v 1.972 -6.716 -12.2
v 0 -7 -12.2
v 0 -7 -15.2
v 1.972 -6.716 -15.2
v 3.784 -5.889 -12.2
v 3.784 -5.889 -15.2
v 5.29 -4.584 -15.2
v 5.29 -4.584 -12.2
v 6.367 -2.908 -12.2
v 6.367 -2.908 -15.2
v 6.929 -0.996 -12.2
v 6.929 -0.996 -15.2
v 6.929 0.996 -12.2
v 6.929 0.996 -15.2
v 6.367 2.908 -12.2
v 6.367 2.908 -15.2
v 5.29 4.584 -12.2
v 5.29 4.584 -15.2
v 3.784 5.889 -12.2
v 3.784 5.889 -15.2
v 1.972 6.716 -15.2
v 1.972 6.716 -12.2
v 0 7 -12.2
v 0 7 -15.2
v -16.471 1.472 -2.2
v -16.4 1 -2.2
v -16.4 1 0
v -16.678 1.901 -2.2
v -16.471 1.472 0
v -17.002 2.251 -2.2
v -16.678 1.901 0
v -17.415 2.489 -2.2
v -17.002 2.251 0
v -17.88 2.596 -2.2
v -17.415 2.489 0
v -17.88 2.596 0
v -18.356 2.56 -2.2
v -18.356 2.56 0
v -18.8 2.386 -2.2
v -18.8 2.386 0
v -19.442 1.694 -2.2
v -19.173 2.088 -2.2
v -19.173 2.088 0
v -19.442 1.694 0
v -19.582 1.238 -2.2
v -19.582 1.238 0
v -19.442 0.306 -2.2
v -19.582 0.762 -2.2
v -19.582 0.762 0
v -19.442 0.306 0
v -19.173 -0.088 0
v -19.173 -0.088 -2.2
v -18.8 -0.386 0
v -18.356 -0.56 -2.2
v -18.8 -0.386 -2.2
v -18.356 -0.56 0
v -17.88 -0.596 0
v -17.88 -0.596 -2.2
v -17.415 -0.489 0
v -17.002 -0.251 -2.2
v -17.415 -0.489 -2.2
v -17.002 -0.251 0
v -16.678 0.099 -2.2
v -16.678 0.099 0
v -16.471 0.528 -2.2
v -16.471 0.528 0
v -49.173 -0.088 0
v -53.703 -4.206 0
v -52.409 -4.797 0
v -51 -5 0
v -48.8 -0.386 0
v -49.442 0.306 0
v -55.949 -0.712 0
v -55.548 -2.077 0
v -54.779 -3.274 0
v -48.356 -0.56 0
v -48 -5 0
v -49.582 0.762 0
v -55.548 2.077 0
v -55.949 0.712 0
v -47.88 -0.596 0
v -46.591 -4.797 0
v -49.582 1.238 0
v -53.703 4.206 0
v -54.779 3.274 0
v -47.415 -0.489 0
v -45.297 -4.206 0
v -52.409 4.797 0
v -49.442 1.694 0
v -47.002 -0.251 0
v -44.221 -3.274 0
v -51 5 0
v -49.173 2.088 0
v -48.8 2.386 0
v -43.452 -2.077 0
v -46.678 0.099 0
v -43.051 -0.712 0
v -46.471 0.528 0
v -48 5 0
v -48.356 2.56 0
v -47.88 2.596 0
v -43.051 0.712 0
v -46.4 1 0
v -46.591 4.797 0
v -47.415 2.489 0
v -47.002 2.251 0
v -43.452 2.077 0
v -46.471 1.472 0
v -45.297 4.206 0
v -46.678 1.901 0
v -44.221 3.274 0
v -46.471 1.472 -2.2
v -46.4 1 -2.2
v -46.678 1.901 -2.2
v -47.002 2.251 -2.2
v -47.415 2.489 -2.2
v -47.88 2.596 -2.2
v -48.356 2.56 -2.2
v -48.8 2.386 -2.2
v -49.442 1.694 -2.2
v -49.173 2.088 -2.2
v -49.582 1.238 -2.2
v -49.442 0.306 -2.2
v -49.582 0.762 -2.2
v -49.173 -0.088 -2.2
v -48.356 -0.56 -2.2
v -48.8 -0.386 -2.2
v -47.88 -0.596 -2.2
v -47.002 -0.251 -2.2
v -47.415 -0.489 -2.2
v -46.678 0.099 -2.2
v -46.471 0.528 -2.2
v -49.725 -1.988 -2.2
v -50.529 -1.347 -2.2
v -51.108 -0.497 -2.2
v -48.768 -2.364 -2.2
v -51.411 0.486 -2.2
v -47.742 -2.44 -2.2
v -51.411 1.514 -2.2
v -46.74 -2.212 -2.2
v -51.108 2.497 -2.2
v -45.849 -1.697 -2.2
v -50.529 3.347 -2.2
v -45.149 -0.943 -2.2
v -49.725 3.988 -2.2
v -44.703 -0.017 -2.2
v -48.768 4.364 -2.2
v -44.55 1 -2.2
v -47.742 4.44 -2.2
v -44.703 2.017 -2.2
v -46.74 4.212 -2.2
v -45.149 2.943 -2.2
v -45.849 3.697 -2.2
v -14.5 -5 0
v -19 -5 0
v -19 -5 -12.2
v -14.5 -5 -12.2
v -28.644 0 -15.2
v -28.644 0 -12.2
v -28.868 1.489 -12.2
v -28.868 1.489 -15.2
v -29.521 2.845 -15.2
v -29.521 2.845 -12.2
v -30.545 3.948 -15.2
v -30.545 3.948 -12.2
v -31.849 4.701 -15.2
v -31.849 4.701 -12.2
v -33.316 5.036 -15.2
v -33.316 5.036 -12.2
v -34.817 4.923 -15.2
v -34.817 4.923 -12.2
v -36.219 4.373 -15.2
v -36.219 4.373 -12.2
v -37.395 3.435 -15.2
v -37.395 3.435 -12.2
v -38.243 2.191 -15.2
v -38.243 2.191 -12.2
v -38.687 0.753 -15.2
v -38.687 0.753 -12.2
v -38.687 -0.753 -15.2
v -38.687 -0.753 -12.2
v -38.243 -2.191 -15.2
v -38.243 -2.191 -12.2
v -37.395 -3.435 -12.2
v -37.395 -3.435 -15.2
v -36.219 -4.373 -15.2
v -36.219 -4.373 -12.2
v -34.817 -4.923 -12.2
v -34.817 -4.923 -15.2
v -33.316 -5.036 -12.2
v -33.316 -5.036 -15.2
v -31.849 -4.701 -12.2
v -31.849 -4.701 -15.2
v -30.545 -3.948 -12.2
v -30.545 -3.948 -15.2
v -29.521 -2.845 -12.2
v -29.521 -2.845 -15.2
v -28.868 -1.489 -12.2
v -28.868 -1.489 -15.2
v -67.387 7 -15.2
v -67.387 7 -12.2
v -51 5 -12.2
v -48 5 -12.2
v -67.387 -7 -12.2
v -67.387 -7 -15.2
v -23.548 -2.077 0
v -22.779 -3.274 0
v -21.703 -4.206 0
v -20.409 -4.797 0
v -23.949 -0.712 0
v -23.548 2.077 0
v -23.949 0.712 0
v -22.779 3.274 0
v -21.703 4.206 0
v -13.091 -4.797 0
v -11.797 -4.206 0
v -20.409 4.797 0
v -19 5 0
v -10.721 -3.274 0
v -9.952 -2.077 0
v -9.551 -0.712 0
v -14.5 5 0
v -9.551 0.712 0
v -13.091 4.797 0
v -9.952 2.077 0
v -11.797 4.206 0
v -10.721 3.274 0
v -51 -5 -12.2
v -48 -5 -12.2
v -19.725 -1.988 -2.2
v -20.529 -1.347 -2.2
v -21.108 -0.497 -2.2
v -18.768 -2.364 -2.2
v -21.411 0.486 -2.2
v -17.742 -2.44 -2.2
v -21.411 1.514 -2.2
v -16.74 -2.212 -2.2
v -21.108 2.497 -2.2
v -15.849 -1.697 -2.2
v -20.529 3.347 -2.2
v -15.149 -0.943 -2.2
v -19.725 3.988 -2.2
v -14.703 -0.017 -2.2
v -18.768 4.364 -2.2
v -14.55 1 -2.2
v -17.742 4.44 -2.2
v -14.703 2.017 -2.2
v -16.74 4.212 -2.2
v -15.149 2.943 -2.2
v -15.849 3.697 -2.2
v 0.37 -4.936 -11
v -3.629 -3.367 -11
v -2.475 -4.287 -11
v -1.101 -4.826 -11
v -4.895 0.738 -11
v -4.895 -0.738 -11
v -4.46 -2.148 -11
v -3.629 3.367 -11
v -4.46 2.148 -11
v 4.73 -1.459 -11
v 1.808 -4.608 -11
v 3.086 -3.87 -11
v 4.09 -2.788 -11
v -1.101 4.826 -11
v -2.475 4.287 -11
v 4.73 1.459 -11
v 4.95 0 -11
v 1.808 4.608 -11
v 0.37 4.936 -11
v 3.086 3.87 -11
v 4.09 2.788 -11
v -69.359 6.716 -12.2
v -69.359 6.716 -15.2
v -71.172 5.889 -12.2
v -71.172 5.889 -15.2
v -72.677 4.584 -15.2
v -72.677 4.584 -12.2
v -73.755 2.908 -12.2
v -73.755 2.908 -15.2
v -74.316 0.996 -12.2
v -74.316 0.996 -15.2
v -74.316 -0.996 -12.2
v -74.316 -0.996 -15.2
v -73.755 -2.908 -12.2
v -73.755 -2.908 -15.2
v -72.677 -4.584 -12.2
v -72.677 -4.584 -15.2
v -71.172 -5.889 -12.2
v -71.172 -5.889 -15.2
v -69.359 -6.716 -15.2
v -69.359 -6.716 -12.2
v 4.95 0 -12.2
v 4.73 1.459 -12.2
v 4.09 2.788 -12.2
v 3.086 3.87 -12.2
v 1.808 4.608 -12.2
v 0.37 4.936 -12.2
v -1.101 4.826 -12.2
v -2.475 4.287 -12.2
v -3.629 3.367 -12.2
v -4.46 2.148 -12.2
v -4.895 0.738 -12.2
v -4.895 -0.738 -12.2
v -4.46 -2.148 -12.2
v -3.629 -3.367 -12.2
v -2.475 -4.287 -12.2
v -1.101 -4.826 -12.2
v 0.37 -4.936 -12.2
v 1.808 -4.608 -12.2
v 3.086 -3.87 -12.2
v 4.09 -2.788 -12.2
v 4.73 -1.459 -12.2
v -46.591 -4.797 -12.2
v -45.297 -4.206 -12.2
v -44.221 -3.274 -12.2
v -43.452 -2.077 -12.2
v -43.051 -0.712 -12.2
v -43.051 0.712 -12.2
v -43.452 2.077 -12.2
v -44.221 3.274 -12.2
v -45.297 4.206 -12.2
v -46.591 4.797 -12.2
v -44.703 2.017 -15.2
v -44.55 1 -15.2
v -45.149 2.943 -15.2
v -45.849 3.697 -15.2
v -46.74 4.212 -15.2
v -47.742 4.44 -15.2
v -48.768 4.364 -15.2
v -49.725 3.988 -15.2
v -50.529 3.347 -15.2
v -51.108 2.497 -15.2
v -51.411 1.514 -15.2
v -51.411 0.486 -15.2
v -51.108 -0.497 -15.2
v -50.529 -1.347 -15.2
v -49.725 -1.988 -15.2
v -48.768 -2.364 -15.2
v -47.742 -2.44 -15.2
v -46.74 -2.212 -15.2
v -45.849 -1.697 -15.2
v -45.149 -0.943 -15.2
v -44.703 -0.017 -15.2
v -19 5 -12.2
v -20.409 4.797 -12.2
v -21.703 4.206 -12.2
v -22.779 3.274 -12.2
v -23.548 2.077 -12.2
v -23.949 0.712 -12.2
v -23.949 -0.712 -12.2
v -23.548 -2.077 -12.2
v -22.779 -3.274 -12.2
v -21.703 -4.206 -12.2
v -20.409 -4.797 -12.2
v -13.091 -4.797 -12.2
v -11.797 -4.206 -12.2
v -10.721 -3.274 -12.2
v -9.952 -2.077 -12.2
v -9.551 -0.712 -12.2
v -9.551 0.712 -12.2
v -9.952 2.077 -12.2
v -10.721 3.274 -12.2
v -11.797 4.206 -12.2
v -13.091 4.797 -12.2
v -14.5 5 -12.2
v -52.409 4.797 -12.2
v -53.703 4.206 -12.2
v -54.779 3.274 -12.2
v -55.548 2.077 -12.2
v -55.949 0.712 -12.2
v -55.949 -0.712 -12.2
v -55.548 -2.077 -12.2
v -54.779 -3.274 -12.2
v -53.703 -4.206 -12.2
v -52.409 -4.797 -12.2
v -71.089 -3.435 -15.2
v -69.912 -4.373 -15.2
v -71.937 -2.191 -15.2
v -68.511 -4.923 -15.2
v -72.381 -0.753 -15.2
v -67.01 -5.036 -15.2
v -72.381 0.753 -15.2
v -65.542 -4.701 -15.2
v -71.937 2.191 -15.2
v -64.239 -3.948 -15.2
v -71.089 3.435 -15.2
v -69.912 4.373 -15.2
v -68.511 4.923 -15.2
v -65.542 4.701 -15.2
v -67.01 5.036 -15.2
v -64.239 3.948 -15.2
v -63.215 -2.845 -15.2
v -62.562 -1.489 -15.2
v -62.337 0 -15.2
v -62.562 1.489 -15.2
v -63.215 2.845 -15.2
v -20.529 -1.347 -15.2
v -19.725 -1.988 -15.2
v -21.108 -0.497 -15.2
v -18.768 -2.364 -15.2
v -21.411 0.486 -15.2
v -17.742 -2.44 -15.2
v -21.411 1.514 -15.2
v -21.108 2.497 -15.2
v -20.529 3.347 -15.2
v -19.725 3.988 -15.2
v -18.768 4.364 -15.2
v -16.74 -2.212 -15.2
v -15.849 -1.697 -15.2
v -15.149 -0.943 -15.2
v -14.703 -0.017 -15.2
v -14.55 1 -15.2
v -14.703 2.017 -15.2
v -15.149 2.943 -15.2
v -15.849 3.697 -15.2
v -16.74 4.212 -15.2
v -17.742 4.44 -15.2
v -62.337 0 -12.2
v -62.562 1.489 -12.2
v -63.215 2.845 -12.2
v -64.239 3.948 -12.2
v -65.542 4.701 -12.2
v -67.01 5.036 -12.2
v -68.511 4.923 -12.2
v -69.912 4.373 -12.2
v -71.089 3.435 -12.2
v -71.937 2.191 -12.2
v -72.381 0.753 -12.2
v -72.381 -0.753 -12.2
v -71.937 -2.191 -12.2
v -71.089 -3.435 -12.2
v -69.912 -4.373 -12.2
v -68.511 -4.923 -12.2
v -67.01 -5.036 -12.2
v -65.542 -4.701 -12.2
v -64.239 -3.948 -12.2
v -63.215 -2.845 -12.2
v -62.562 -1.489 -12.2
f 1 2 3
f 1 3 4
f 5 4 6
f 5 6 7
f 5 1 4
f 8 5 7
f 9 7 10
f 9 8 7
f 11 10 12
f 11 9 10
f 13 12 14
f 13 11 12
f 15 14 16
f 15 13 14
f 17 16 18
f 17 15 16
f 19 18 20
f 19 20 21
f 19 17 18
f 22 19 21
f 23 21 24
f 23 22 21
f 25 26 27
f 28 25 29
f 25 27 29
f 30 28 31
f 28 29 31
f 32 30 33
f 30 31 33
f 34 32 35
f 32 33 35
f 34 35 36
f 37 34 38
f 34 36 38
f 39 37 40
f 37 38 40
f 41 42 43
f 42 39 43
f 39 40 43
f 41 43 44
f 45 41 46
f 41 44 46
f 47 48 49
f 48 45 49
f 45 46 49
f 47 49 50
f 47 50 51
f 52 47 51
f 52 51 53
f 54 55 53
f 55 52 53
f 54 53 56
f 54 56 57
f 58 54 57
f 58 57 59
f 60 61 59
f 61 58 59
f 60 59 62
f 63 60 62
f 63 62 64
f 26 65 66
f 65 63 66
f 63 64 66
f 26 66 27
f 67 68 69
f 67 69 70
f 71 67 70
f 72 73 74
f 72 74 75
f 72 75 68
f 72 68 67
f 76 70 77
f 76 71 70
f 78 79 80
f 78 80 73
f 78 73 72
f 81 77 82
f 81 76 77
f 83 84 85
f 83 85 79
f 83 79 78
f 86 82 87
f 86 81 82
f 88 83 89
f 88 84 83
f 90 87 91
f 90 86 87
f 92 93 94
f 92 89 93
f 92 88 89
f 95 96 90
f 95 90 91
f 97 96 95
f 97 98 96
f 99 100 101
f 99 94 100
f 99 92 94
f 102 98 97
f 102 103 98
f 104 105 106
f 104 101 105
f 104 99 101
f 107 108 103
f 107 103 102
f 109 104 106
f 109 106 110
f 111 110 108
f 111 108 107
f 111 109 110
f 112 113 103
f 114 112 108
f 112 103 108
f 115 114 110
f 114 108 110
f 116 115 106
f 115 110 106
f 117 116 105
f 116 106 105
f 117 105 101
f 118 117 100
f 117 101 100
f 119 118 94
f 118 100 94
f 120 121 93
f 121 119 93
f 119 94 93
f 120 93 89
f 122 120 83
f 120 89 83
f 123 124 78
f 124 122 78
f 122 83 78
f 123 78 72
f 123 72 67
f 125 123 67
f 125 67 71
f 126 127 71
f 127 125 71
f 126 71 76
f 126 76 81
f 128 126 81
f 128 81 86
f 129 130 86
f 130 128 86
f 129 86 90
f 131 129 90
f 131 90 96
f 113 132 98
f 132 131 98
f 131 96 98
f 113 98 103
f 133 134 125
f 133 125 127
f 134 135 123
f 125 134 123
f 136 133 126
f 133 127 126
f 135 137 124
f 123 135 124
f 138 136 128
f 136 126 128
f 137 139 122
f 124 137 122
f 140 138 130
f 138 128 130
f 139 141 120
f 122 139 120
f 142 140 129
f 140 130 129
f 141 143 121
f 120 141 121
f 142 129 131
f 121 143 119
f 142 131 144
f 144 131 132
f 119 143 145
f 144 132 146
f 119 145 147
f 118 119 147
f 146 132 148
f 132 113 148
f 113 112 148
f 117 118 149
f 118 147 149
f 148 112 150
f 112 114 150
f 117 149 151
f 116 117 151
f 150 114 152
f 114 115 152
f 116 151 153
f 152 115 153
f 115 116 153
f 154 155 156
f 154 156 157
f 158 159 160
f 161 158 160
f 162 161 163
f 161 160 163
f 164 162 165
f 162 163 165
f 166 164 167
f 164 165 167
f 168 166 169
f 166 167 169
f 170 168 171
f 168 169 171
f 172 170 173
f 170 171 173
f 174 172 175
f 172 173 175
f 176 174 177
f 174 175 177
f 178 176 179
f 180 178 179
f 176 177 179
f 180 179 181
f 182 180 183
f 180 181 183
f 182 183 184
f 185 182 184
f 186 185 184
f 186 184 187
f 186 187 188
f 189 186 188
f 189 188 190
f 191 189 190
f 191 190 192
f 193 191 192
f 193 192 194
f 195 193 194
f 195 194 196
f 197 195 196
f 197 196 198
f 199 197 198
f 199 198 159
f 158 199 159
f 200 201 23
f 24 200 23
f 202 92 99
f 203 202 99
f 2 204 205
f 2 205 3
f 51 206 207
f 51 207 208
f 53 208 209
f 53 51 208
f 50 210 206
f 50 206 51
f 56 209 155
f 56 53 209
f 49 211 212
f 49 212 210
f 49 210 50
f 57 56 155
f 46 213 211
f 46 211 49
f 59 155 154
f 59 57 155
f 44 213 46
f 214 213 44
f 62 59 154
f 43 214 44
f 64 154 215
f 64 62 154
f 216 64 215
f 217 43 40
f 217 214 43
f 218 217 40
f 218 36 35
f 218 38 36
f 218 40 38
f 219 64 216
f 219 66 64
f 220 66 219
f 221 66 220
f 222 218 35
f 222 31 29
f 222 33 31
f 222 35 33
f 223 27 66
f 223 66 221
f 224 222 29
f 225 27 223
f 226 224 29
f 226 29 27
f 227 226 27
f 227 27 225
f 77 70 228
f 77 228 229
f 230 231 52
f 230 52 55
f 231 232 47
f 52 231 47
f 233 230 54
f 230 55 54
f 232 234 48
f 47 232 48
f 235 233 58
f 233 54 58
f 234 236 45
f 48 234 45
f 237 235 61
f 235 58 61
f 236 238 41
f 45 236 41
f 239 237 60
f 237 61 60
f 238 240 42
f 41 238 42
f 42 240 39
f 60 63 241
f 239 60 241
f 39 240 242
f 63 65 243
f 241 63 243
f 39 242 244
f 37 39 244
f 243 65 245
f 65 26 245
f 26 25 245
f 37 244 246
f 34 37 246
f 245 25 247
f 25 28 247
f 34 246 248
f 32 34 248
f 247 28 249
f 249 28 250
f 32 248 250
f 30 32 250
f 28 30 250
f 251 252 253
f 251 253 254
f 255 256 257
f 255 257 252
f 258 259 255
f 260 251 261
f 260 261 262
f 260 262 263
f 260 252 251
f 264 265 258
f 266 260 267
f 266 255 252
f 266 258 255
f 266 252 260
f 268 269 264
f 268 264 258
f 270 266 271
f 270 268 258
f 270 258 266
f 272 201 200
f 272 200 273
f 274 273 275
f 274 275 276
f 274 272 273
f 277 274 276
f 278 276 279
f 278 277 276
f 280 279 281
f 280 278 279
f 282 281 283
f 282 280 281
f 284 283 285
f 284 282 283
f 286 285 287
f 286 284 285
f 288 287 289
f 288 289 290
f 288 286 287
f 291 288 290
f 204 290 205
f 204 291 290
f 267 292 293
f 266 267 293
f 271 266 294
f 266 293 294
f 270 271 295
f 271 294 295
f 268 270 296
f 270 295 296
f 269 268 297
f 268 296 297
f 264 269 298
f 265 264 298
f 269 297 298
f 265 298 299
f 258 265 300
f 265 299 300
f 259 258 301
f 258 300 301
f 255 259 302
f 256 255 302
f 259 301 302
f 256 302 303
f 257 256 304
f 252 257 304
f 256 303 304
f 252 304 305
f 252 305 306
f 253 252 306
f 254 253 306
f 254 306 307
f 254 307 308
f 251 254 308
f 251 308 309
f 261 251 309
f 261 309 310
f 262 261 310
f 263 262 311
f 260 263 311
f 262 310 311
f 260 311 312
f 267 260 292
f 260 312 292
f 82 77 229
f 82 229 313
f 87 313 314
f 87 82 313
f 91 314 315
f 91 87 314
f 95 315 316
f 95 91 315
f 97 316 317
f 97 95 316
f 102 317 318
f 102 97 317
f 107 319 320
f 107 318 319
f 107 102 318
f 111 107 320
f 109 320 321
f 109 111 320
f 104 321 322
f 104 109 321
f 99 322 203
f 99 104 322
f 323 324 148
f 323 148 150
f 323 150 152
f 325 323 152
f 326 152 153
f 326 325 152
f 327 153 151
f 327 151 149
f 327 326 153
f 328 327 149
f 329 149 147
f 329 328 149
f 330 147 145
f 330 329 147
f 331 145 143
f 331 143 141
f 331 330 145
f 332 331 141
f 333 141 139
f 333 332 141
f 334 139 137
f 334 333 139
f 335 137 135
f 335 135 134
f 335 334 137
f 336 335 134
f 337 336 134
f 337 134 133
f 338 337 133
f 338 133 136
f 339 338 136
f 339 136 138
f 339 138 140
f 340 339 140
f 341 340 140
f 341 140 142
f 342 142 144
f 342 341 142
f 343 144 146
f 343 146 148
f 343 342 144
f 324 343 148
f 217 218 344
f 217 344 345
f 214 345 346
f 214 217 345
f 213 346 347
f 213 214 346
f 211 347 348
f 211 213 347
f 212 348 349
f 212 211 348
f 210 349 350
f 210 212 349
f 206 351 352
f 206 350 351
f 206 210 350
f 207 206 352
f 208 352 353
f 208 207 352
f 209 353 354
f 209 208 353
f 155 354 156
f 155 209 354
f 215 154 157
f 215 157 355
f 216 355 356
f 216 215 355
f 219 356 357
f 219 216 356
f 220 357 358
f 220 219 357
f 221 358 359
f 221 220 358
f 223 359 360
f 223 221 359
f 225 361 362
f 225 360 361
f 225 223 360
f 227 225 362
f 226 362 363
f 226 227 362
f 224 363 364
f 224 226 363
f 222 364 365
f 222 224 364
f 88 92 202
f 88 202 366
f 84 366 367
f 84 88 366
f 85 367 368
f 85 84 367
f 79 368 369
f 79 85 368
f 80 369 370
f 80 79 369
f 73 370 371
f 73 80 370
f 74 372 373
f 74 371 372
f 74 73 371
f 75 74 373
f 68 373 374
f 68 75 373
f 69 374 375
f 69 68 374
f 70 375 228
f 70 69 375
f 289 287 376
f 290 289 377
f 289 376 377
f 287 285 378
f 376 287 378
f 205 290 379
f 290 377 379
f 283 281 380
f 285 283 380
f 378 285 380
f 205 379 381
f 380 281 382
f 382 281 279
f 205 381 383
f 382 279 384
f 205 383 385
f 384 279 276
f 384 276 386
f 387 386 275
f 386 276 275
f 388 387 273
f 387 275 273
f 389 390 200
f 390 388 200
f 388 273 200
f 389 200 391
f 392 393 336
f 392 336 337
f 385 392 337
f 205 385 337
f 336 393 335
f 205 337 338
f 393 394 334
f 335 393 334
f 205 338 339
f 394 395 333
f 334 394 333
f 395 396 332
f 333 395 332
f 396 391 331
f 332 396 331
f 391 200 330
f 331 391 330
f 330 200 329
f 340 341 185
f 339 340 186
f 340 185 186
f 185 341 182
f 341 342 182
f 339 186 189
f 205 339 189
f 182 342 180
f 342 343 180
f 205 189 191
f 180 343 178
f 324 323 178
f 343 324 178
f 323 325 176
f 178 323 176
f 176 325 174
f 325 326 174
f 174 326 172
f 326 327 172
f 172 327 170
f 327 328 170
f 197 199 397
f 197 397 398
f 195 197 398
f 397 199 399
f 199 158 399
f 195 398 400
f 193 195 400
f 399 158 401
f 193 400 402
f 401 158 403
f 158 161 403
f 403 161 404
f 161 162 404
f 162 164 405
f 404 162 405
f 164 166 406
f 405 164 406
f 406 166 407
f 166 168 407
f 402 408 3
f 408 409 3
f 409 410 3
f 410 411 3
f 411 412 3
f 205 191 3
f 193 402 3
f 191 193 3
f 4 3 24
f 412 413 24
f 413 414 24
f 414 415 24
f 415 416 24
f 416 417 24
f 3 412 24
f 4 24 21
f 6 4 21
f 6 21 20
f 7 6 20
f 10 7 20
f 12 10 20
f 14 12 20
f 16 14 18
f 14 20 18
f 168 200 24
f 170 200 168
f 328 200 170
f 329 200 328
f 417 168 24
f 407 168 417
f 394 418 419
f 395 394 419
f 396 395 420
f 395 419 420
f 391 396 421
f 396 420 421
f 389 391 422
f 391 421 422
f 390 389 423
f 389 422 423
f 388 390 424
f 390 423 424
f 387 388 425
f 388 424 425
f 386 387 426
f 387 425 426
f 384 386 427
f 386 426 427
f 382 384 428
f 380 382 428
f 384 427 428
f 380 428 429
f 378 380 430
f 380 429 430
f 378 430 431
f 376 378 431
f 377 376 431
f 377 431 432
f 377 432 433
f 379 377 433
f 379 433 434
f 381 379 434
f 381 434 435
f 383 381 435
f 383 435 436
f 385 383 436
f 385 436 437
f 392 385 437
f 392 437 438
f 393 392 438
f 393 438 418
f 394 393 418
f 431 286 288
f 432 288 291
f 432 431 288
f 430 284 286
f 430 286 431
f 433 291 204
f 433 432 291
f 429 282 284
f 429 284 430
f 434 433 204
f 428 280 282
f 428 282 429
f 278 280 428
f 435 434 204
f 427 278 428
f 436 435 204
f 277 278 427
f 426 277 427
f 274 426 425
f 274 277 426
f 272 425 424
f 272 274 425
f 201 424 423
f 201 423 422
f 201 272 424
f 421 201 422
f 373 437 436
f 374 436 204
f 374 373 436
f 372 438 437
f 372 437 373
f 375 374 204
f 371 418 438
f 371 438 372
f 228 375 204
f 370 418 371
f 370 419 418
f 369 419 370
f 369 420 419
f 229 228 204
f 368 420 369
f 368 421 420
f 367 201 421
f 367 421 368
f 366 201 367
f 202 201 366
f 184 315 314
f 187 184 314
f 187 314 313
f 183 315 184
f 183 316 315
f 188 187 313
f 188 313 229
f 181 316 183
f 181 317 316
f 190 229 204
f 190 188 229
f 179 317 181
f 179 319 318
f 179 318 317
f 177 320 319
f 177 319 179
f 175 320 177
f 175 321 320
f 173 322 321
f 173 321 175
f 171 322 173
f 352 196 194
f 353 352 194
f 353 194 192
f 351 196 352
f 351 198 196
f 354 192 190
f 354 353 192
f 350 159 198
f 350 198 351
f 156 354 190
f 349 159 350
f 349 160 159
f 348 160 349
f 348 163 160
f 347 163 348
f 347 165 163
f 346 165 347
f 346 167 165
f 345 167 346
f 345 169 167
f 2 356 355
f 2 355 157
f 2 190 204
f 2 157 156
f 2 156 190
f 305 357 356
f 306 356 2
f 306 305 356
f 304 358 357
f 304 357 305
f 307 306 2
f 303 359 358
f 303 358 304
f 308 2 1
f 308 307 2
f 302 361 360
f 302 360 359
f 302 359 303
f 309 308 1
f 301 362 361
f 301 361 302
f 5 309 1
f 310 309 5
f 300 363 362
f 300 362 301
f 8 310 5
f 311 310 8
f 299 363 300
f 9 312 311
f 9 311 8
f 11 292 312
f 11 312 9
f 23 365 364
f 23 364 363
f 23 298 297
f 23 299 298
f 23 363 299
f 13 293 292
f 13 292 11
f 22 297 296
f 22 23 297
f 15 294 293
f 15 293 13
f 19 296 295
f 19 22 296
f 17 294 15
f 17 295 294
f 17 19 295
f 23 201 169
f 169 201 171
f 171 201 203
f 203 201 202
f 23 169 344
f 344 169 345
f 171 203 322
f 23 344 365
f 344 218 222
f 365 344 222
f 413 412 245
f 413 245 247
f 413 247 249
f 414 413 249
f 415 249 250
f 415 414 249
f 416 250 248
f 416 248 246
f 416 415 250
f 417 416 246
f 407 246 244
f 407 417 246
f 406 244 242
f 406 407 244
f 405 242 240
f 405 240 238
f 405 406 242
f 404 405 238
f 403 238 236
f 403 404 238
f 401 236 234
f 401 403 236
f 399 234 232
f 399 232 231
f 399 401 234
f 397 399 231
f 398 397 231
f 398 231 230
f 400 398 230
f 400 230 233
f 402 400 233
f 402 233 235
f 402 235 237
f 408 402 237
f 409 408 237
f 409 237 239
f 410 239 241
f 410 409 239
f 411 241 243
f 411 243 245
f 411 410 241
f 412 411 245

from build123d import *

# Parameters (mm, degrees)
PAD008_DEPTH    = 3
PAD009_DEPTH    = 15.2
SKETCH025_R     = 5.05
SKETCH025_R_2   = 1.6
POCKET_DEPTH    = 15.2
SKETCH026_R     = 4.95
PAD010_DEPTH    = 1.2
SKETCH027_R     = 3.45
POCKET001_DEPTH = 13


with BuildPart() as leftdrivegearretainerbody:
    # Sketch023 → Pad008 (new body)
    with BuildSketch(Plane.XY.offset(12.2)):
        with BuildLine():
            ThreePointArc((-67.387162, 7), (-74.387162, 0), (-67.387162, -7))
            Line((-67.387162, -7), (0, -7))
            ThreePointArc((0, -7), (7, 0), (0, 7))
            Line((-67.387162, 7), (0, 7))
        make_face()
    extrude(amount=PAD008_DEPTH)

    # Sketch024 → Pad009 (join)
    with BuildSketch(Plane.XY):
        with BuildLine():
            ThreePointArc((-19, 5), (-24, 0), (-19, -5))
            Line((-19, -5), (-14.5, -5))
            ThreePointArc((-14.5, -5), (-9.5, 0), (-14.5, 5))
            Line((-19, 5), (-14.5, 5))
        make_face()
        with BuildLine():
            ThreePointArc((-51, 5), (-56, 0), (-51, -5))
            Line((-51, -5), (-48, -5))
            ThreePointArc((-48, -5), (-43, 0), (-48, 5))
            Line((-51, 5), (-48, 5))
        make_face()
    extrude(amount=PAD009_DEPTH)

    # Sketch025 → Pocket (cut)
    with BuildSketch(Plane.XY):
        with Locations((-33.693581, 0)):
            Circle(SKETCH025_R)
        with Locations((-67.387162, 0)):
            Circle(SKETCH025_R)
        with Locations((-18, 1)):
            Circle(SKETCH025_R_2)
        with Locations((-48, 1)):
            Circle(SKETCH025_R_2)
    extrude(amount=POCKET_DEPTH, mode=Mode.SUBTRACT)

    # Sketch026 → Pad010 (join)
    with BuildSketch(Plane.XY.offset(12.2)):
        Circle(SKETCH026_R)
    extrude(amount=-PAD010_DEPTH)

    # Sketch027 → Pocket001 (cut)
    with BuildSketch(Plane.XY.offset(15.2)):
        with Locations((-18, 1)):
            Circle(SKETCH027_R)
        with Locations((-48, 1)):
            Circle(SKETCH027_R)
    extrude(amount=-POCKET001_DEPTH, mode=Mode.SUBTRACT)


with BuildPart() as rightdrivegearretainer:
    # Part__Mirroring004: instance of LeftDriveGearRetainerBody
    add(leftdrivegearretainerbody.part.mirror(Plane(origin=(0, 0, 0), x_dir=(0, 1, 0), z_dir=(0, 0, 1))))


solid = rightdrivegearretainer.part
